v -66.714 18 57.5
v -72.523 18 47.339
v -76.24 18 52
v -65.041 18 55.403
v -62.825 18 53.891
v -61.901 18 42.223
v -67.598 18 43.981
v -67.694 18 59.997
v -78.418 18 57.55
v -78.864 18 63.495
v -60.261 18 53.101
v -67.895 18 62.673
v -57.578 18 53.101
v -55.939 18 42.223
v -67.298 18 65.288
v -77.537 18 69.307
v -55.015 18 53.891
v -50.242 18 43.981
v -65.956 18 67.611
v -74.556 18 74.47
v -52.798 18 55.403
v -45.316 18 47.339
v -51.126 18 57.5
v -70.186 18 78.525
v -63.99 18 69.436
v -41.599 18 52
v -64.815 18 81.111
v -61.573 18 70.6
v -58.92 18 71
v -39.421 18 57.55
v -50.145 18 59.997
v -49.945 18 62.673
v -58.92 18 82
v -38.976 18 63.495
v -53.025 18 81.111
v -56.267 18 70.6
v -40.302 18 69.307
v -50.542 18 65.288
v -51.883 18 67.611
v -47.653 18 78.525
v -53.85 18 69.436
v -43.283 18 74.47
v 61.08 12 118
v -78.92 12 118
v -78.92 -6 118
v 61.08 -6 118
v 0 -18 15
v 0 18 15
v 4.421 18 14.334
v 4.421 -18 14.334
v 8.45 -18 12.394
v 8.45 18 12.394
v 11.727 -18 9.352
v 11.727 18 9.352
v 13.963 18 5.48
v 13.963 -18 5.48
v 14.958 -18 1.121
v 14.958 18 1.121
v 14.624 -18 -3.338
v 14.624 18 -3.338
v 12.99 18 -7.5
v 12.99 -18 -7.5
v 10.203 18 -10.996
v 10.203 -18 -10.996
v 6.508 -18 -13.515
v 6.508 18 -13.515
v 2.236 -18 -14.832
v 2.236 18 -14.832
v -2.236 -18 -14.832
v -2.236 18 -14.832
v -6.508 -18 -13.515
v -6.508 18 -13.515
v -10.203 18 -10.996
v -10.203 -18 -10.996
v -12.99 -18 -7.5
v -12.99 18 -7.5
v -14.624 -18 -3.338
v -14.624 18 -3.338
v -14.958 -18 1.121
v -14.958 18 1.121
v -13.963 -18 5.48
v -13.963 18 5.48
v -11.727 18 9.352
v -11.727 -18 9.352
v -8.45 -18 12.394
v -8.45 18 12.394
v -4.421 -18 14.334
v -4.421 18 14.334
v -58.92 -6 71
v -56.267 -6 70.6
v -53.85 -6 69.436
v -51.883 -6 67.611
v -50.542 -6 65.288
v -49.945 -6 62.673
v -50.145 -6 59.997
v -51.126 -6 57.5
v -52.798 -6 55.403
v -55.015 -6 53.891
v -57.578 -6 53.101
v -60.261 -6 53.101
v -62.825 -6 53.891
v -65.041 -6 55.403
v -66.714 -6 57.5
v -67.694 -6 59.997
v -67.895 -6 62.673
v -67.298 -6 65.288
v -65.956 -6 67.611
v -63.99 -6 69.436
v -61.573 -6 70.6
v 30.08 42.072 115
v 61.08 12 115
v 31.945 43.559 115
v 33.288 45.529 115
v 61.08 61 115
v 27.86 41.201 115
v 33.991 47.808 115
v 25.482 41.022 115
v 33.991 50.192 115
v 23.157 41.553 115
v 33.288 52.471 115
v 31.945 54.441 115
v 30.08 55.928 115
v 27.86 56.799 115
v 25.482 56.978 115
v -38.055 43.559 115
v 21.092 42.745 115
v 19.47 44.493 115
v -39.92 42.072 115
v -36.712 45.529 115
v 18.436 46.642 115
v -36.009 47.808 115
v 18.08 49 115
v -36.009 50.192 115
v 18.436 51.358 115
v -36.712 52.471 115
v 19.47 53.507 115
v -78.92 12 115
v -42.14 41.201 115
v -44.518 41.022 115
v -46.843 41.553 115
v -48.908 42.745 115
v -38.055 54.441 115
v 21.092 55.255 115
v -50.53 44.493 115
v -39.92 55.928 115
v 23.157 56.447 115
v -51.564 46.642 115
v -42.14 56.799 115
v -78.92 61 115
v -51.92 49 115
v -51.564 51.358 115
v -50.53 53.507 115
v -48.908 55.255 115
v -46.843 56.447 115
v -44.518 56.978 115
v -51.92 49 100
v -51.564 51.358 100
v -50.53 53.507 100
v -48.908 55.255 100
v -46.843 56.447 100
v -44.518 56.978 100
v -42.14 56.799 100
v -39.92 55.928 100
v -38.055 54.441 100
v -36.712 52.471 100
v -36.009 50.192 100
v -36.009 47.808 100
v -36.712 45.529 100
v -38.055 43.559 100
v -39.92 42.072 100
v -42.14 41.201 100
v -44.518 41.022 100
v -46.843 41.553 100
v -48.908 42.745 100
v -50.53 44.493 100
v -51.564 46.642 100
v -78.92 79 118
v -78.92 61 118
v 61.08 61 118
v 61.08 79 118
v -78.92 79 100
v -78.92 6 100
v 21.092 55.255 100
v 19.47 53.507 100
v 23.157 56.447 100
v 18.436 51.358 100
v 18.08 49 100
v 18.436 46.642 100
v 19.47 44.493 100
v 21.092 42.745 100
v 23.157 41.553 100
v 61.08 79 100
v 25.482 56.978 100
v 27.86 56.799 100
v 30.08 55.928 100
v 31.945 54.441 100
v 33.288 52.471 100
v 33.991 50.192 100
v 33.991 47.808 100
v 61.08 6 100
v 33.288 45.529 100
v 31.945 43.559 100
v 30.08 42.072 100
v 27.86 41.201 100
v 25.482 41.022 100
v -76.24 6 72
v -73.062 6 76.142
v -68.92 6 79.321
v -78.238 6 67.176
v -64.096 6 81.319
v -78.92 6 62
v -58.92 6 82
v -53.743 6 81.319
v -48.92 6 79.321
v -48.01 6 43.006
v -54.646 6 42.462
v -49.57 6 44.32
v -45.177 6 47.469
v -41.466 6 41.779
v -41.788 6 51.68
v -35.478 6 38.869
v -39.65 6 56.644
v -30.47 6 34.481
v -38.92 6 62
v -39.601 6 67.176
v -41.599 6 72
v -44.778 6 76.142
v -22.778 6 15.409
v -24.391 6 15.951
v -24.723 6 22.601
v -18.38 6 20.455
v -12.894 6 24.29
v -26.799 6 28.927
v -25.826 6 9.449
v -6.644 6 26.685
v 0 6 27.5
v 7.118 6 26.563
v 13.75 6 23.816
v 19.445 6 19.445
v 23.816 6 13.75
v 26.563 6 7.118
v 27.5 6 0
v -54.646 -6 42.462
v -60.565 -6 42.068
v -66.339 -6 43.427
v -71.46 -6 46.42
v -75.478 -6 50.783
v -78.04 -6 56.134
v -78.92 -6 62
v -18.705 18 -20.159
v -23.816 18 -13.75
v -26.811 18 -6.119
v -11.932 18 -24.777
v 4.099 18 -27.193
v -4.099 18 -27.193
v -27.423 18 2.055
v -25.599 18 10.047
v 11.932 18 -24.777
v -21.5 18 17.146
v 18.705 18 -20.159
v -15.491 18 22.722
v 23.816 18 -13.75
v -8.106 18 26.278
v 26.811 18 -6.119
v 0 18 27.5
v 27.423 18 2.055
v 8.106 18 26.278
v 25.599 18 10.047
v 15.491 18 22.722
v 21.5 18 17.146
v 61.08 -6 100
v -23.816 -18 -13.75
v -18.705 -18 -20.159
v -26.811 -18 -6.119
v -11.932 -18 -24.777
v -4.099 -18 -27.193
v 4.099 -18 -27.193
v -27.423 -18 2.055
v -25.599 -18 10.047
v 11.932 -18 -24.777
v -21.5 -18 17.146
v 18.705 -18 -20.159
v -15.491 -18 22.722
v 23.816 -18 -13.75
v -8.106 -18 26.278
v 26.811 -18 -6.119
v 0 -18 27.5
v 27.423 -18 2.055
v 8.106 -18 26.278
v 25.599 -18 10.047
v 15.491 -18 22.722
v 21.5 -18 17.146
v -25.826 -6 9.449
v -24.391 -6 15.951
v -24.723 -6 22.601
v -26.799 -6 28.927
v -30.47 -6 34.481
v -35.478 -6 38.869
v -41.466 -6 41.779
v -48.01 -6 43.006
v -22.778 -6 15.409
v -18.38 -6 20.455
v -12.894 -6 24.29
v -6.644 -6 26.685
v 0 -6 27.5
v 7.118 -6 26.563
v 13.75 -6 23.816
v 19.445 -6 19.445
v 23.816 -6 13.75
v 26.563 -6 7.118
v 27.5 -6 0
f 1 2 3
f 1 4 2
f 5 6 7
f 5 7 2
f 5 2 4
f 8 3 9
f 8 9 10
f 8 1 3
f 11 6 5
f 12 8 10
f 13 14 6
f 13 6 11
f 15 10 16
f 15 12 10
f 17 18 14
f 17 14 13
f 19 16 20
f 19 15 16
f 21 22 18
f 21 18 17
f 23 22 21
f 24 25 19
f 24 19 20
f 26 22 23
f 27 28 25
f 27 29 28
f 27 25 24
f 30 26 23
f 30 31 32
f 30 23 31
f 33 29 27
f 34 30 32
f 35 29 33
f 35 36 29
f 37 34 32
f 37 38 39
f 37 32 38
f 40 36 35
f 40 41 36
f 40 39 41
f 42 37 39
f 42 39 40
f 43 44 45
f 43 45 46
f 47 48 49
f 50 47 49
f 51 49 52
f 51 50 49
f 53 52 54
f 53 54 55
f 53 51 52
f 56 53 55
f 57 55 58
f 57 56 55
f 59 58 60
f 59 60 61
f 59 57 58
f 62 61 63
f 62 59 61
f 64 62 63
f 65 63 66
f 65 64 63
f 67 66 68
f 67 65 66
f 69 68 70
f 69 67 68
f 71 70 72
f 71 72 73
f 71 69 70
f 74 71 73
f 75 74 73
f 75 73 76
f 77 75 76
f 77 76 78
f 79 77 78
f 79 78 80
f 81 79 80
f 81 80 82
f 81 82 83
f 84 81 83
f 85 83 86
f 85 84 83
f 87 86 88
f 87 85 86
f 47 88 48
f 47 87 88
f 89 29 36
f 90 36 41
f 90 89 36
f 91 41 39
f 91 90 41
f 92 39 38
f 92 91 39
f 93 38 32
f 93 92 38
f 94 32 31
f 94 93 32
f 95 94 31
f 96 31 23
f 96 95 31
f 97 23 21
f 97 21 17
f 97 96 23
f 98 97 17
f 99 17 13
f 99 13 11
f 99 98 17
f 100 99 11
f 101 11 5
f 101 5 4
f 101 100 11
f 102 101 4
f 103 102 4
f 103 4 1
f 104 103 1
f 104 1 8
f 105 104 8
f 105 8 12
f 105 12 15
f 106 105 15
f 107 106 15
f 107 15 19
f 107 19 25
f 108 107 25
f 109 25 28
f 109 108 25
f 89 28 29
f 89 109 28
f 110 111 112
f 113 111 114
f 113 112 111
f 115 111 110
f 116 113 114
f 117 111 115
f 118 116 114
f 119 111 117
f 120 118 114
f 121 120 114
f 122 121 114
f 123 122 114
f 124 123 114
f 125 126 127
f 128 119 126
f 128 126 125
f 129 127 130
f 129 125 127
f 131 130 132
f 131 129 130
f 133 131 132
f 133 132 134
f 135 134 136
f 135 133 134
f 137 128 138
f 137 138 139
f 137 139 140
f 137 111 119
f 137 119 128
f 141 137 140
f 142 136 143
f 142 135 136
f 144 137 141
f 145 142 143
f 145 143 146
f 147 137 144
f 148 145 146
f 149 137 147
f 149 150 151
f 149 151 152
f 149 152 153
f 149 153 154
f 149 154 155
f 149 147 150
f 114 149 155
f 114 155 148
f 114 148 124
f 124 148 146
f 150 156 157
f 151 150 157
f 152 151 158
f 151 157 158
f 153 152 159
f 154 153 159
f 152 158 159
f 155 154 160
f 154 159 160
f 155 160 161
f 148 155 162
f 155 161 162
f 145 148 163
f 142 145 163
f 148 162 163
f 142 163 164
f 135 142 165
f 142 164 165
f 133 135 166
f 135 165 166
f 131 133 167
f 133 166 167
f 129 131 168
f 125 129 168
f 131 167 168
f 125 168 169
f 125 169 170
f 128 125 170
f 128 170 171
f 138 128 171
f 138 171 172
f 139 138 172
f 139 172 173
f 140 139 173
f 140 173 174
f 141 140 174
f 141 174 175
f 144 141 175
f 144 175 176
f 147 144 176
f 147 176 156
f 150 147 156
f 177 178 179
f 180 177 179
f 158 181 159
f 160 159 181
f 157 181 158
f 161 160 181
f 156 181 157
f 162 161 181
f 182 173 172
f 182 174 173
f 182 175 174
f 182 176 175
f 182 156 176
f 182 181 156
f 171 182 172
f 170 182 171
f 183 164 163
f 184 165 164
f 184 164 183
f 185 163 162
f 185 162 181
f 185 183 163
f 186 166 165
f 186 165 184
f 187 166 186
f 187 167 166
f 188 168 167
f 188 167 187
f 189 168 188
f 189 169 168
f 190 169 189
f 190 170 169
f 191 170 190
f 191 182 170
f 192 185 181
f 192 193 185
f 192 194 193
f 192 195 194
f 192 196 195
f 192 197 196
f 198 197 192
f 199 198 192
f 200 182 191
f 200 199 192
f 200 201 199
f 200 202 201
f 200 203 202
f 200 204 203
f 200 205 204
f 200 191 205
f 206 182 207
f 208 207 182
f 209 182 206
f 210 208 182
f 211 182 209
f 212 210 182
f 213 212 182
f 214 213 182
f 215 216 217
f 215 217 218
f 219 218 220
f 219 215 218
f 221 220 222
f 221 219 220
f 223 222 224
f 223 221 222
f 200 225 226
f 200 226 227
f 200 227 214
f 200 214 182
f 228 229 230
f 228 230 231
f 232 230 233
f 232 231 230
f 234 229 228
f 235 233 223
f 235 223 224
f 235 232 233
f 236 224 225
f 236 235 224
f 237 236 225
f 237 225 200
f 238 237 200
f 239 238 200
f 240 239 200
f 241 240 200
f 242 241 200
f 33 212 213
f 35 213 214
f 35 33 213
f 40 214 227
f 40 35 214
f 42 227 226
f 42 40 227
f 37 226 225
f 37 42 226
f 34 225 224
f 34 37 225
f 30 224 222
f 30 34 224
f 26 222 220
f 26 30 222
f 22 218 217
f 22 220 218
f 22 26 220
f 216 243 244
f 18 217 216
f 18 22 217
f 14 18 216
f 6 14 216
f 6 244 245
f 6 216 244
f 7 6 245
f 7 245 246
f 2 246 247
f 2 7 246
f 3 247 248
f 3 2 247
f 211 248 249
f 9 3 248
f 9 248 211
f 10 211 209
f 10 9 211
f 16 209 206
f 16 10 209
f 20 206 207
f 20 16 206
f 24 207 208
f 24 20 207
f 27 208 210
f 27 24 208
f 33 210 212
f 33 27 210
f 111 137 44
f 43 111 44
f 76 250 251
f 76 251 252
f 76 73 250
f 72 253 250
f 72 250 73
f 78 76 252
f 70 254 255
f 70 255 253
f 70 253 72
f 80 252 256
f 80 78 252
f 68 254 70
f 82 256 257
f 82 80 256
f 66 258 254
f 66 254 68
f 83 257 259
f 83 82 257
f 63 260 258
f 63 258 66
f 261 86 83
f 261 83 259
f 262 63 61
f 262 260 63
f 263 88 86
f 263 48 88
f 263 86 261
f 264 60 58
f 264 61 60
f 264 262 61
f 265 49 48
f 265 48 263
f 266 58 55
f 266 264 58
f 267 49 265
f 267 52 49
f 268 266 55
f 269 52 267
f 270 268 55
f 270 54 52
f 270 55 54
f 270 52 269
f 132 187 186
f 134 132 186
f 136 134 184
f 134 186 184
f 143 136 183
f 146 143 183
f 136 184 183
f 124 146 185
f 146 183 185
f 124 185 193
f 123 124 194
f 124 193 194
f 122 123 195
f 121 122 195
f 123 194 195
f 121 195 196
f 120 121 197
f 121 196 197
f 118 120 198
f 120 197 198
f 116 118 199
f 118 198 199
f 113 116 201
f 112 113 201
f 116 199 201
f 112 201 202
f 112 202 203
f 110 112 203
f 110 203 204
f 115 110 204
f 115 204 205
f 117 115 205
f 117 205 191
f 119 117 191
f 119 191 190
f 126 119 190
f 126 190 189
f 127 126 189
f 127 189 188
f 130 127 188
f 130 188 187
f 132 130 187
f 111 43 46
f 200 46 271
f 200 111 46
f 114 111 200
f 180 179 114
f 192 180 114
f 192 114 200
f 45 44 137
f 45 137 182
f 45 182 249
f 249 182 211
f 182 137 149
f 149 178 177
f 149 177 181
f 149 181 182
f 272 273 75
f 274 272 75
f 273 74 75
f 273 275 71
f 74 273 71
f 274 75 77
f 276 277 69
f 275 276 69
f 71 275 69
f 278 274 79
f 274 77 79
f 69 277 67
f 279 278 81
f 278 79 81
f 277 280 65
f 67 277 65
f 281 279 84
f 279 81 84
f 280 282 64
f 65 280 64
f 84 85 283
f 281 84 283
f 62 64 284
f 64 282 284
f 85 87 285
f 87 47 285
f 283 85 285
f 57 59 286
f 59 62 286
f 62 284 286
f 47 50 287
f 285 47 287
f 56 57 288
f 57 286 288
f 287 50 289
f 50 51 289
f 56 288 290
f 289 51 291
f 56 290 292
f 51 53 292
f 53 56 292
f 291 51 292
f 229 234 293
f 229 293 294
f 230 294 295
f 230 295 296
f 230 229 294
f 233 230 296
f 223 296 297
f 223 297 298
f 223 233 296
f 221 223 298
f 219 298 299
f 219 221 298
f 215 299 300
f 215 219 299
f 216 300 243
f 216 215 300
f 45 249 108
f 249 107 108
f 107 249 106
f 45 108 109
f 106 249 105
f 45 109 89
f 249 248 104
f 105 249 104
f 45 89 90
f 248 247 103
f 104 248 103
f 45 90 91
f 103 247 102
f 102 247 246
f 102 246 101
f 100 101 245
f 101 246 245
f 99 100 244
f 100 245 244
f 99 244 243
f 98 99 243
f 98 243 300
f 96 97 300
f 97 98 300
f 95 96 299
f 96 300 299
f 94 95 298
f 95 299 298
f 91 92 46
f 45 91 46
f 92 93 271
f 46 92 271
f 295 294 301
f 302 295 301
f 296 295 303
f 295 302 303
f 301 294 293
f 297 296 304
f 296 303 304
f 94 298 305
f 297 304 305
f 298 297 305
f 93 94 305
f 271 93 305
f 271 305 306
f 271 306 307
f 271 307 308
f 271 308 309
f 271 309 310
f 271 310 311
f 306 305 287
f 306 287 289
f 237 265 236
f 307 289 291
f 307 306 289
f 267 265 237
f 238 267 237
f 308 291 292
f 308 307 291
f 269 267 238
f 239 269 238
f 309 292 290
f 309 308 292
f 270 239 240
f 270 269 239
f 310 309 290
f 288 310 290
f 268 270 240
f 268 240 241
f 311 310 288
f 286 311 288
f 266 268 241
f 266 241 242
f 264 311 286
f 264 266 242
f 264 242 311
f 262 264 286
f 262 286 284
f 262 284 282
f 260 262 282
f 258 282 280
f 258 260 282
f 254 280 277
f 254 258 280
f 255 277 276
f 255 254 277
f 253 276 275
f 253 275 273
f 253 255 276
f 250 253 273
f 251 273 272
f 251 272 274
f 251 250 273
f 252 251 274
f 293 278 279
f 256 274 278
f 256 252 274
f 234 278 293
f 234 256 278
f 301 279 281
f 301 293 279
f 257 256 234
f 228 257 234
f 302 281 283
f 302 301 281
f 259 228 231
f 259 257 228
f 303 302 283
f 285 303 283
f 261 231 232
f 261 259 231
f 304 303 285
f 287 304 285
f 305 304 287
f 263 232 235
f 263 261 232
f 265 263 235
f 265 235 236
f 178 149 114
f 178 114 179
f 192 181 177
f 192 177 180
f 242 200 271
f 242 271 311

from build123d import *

# Parameters (mm, degrees)
SKETCH1_R           = 15
BOSS_EXTRUDE1_DEPTH = 18
BOSS_EXTRUDE2_DEPTH = 6
SKETCH1_4_R         = 9
BOSS_EXTRUDE3_DEPTH = 18
SKETCH2_R           = 20
SKETCH2_R_2         = 9
CUT_EXTRUDE1_DEPTH  = 12
SKETCH1_5_W         = 140
SKETCH1_5_H         = 18
BOSS_EXTRUDE4_DEPTH = 79
CUT_EXTRUDE2_REACH  = 171.486
SKETCH4_R           = 8
CUT_EXTRUDE3_REACH  = 201.412
SKETCH5_W           = 3
SKETCH5_H           = 49
SKETCH1_6_W         = 140
SKETCH1_6_H         = 18
BOSS_EXTRUDE5_DEPTH = 6


with BuildPart() as part:
    # Sketch1 → Boss-Extrude1 (new, symmetric)
    with BuildSketch(Plane(origin=(0, 0, 0), x_dir=(1, 0, 0), z_dir=(0, 1, 0))):
        with BuildLine():
            ThreePointArc((-25.82559397, -9.449269605), (4.798237479, -27.078163104), (27.5, 0))
            ThreePointArc((27.5, 0), (-4.798237479, 27.078163104), (-25.82559397, -9.449269605))
        make_face()
        Circle(SKETCH1_R, mode=Mode.SUBTRACT)
    extrude(amount=BOSS_EXTRUDE1_DEPTH, both=True)

    # Sketch1<3> → Boss-Extrude2 (add, symmetric)
    with BuildSketch(Plane(origin=(0, 0, 0), x_dir=(1, 0, 0), z_dir=(0, 1, 0))):
        with BuildLine():
            Line((-78.919837001, -62), (-78.919837001, -100))
            Line((-78.919837001, -100), (61.080162999, -100))
            Line((61.080162999, -100), (27.5, 0))
            ThreePointArc((27.5, 0), (4.798237479, -27.078163104), (-25.82559397, -9.449269605))
            ThreePointArc((-25.82559397, -9.449269605), (-30.4703787, -34.480836347), (-54.645867965, -42.462006534))
            ThreePointArc((-54.645867965, -42.462006534), (-43.339731406, -49.45965273), (-38.919837001, -62))
            ThreePointArc((-38.919837001, -62), (-58.919837001, -82), (-78.919837001, -62))
        make_face()
    extrude(amount=BOSS_EXTRUDE2_DEPTH, both=True)

    # Sketch1<4> → Boss-Extrude3 (add, symmetric)
    with BuildSketch(Plane(origin=(0, 0, 0), x_dir=(1, 0, 0), z_dir=(0, 1, 0))):
        with BuildLine():
            ThreePointArc((-54.645867965, -42.462006534), (-71.460184271, -46.419894405), (-78.919837001, -62))
            ThreePointArc((-78.919837001, -62), (-58.919837001, -82), (-38.919837001, -62))
            ThreePointArc((-38.919837001, -62), (-43.339731406, -49.45965273), (-54.645867965, -42.462006534))
        make_face()
        with Locations((-58.919837001, -62)):
            Circle(SKETCH1_4_R, mode=Mode.SUBTRACT)
    extrude(amount=BOSS_EXTRUDE3_DEPTH, both=True)

    # Sketch2 → Cut-Extrude1 (cut)
    with BuildSketch(Plane.XZ.offset(18)):
        with Locations((-58.919837001, 62)):
            Circle(SKETCH2_R)
        with Locations((-58.919837001, 62)):
            Circle(SKETCH2_R_2, mode=Mode.SUBTRACT)
    extrude(amount=-CUT_EXTRUDE1_DEPTH, mode=Mode.SUBTRACT)

    # Sketch1<5> → Boss-Extrude4 (add)
    with BuildSketch(Plane(origin=(0, 0, 0), x_dir=(1, 0, 0), z_dir=(0, 1, 0))):
        with Locations((-8.919837001, -109)):
            Rectangle(SKETCH1_5_W, SKETCH1_5_H)
    extrude(amount=BOSS_EXTRUDE4_DEPTH)

    # Sketch4 → Cut-Extrude2 (cut, up to next)
    with BuildSketch(Plane(origin=(0, 0, 100), x_dir=(-1, 0, 0), z_dir=(0, 0, -1)), mode=Mode.PRIVATE) as cut_extrude2_sk1:
        with Locations((-26.080162999, 49)):
            Circle(SKETCH4_R)
    cut_extrude2_tool1 = extrude(cut_extrude2_sk1.sketch, amount=-CUT_EXTRUDE2_REACH, mode=Mode.PRIVATE) & part.part
    # Sketch4 → Cut-Extrude2 (cut, up to next)
    with BuildSketch(Plane(origin=(0, 0, 100), x_dir=(-1, 0, 0), z_dir=(0, 0, -1)), mode=Mode.PRIVATE) as cut_extrude2_sk2:
        with Locations((43.919837001, 49)):
            Circle(SKETCH4_R)
    cut_extrude2_tool2 = extrude(cut_extrude2_sk2.sketch, amount=-CUT_EXTRUDE2_REACH, mode=Mode.PRIVATE) & part.part
    add(cut_extrude2_tool1.solids().sort_by_distance((26.080163, 49, 100))[0], mode=Mode.SUBTRACT)
    add(cut_extrude2_tool2.solids().sort_by_distance((-43.919837, 49, 100))[0], mode=Mode.SUBTRACT)

    # Sketch5 → Cut-Extrude3 (cut, up to next)
    with BuildSketch(Plane.ZY.offset(78.919837001), mode=Mode.PRIVATE) as cut_extrude3_sk1:
        with Locations((116.5, 36.5)):
            Rectangle(SKETCH5_W, SKETCH5_H)
    cut_extrude3_tool1 = extrude(cut_extrude3_sk1.sketch, amount=-CUT_EXTRUDE3_REACH, mode=Mode.PRIVATE) & part.part
    add(cut_extrude3_tool1.solids().sort_by_distance((-78.919837, 36.5, 116.5))[0], mode=Mode.SUBTRACT)

    # Sketch1<6> → Boss-Extrude5 (add)
    with BuildSketch(Plane(origin=(0, 0, 0), x_dir=(1, 0, 0), z_dir=(0, 1, 0))):
        with Locations((-8.919837001, -109)):
            Rectangle(SKETCH1_6_W, SKETCH1_6_H)
    extrude(amount=-BOSS_EXTRUDE5_DEPTH)


solid = part.part
